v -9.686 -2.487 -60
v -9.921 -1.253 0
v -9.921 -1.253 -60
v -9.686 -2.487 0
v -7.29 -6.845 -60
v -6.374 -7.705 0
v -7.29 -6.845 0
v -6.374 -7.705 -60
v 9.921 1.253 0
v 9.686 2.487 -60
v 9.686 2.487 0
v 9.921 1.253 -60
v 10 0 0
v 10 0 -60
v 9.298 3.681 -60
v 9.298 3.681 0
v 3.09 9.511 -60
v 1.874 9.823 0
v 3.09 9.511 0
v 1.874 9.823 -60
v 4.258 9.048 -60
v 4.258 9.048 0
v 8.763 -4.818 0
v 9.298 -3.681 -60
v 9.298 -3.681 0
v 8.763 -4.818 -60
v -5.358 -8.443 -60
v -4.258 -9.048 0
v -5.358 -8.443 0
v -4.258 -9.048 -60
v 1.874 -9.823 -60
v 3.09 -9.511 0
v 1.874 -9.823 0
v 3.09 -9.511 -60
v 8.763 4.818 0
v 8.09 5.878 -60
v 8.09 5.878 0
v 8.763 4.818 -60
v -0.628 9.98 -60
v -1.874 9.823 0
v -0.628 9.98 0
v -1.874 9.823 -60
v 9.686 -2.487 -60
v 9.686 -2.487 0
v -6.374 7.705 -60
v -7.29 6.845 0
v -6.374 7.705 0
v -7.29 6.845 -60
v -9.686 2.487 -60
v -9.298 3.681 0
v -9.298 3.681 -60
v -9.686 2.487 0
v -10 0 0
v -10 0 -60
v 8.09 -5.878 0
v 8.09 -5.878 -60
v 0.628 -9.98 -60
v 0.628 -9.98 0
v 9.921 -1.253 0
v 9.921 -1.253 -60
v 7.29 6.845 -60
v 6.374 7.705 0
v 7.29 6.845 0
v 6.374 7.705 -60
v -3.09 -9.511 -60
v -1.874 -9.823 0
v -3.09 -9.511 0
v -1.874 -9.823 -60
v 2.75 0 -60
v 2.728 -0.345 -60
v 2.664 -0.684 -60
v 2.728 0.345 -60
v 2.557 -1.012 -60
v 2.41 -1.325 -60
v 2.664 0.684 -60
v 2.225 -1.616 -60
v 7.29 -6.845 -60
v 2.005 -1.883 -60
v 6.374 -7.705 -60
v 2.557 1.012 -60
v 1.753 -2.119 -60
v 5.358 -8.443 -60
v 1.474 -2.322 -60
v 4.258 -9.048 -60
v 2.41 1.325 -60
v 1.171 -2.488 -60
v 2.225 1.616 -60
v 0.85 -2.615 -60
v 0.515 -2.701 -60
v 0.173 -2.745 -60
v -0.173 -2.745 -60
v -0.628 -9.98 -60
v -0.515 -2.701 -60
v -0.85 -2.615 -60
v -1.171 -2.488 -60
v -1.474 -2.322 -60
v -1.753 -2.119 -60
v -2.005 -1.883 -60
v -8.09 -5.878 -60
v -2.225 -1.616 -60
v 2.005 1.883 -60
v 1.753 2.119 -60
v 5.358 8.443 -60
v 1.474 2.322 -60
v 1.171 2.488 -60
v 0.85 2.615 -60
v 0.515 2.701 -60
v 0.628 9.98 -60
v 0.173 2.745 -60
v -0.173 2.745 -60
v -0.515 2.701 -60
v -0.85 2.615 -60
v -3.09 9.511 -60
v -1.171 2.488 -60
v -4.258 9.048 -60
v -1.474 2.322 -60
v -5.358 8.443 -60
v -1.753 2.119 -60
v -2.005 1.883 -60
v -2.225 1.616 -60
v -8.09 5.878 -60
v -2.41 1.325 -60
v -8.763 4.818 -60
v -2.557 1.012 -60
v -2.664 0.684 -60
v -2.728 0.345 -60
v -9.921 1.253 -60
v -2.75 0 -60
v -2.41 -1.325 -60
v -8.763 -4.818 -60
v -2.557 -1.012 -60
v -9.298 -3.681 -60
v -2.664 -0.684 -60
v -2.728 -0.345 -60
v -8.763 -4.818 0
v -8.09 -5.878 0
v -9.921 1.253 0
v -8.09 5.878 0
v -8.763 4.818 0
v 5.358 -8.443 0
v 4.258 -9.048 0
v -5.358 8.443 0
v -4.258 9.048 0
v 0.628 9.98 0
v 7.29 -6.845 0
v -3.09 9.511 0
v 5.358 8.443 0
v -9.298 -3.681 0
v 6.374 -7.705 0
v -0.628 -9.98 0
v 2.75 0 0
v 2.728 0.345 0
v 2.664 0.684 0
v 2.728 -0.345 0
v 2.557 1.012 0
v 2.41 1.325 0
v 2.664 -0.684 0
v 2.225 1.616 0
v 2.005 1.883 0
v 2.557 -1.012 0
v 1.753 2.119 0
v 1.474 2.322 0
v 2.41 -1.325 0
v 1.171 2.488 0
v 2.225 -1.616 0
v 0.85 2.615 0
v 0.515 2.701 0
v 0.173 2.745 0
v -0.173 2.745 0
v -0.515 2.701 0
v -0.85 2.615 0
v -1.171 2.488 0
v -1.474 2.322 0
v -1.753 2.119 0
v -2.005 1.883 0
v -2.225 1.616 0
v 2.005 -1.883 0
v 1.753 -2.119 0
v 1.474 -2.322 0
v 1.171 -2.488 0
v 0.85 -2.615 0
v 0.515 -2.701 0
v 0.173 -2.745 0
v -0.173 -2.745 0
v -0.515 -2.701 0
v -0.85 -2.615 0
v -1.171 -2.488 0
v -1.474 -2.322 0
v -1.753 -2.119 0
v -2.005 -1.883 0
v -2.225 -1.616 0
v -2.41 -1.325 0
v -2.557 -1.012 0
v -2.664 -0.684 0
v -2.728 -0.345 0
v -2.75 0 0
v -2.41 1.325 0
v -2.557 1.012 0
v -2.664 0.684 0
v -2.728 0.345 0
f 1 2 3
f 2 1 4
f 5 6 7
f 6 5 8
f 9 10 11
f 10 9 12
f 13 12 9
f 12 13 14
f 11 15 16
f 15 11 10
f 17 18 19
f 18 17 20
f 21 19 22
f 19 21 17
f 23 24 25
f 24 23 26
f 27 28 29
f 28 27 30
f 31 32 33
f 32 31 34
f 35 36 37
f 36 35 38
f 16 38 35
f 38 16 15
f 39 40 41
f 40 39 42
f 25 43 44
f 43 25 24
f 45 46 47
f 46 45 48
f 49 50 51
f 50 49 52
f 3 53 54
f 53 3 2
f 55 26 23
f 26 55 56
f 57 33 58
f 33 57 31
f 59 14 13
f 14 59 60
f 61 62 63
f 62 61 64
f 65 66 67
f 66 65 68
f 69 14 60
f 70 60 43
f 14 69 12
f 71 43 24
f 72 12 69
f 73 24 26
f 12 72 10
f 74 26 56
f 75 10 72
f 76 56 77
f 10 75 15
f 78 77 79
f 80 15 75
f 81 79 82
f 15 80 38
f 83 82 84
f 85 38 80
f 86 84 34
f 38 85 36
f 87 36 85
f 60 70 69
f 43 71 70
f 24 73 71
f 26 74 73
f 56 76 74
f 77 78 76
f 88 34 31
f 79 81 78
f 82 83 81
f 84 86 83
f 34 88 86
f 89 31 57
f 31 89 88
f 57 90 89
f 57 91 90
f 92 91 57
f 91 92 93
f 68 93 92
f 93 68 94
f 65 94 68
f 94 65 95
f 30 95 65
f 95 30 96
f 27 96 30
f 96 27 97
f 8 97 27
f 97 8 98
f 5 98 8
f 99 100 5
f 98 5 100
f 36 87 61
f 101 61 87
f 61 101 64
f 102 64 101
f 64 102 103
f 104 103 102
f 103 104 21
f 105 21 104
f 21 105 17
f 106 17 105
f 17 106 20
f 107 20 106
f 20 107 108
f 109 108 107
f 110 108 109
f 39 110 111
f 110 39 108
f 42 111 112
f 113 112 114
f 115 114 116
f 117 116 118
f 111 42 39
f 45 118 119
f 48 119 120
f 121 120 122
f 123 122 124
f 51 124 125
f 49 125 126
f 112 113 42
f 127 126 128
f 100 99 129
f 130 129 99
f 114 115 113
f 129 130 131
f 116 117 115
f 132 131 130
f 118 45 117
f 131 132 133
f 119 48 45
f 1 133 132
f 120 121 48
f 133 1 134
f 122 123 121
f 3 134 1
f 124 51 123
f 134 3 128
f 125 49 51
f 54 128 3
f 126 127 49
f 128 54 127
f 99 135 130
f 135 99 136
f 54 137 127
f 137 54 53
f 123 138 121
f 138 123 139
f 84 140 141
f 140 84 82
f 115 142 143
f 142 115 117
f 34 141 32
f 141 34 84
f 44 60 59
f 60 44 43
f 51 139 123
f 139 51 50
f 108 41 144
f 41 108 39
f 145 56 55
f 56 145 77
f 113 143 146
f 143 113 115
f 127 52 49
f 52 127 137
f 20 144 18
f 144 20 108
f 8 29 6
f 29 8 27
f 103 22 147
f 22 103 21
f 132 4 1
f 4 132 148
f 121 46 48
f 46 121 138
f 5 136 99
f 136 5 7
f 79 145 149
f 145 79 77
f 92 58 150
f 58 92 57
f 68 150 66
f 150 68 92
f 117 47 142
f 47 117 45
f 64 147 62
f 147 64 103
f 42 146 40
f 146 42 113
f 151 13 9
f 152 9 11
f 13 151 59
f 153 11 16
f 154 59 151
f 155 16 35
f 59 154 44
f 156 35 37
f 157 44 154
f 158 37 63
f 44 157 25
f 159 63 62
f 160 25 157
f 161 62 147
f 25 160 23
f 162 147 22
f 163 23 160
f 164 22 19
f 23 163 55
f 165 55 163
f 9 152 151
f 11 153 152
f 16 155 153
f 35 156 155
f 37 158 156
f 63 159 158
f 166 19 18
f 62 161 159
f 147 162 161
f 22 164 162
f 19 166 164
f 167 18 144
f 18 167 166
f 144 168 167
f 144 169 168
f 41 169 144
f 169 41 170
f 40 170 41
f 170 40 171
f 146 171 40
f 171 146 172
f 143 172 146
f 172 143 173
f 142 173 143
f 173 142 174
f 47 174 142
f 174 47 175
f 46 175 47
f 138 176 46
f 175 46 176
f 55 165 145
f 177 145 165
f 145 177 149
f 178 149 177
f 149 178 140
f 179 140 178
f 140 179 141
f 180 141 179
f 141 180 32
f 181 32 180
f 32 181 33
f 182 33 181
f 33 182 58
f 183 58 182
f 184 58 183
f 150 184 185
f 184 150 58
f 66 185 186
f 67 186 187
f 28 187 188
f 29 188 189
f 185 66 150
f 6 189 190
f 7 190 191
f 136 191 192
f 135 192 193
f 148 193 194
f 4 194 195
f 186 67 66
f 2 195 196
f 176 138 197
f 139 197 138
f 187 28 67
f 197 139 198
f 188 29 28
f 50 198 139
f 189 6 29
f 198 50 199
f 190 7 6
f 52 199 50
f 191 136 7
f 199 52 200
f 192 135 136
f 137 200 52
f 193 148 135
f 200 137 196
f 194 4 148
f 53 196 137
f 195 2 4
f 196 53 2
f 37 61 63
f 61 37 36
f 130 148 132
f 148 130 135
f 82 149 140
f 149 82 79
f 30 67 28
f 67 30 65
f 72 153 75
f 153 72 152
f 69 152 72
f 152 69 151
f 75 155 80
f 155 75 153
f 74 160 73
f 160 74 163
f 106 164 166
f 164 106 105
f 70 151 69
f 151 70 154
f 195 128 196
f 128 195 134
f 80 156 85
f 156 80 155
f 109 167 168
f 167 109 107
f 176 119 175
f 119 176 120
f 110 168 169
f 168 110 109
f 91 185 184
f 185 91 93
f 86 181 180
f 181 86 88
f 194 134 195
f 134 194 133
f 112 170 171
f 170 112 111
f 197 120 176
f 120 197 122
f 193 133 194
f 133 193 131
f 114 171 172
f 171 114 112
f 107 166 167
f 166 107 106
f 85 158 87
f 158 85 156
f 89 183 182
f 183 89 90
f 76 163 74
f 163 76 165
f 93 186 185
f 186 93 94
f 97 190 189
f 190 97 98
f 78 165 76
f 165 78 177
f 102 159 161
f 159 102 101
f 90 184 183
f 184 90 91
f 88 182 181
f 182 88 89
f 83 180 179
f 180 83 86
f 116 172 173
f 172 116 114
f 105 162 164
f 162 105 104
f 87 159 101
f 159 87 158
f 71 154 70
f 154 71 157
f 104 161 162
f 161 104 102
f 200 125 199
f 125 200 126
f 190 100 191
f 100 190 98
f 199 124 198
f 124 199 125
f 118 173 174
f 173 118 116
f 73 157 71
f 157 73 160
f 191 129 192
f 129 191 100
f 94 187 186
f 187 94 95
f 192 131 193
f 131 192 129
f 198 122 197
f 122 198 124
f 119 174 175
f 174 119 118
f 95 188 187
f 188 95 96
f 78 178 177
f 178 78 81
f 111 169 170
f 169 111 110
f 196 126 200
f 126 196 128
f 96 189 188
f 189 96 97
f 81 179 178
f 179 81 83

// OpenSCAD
$fn = 50;


difference() {
	union() {
		translate(v = [0, 0, -60.0000000000]) {
			cylinder(h = 60, r = 10.0000000000);
		}
		cylinder(h = 0, r = 13.0000000000);
	}
	union() {
		#translate(v = [0, 0, -60]) {
			cylinder(h = 60, r = 2.7500000000);
		}
	}
}
